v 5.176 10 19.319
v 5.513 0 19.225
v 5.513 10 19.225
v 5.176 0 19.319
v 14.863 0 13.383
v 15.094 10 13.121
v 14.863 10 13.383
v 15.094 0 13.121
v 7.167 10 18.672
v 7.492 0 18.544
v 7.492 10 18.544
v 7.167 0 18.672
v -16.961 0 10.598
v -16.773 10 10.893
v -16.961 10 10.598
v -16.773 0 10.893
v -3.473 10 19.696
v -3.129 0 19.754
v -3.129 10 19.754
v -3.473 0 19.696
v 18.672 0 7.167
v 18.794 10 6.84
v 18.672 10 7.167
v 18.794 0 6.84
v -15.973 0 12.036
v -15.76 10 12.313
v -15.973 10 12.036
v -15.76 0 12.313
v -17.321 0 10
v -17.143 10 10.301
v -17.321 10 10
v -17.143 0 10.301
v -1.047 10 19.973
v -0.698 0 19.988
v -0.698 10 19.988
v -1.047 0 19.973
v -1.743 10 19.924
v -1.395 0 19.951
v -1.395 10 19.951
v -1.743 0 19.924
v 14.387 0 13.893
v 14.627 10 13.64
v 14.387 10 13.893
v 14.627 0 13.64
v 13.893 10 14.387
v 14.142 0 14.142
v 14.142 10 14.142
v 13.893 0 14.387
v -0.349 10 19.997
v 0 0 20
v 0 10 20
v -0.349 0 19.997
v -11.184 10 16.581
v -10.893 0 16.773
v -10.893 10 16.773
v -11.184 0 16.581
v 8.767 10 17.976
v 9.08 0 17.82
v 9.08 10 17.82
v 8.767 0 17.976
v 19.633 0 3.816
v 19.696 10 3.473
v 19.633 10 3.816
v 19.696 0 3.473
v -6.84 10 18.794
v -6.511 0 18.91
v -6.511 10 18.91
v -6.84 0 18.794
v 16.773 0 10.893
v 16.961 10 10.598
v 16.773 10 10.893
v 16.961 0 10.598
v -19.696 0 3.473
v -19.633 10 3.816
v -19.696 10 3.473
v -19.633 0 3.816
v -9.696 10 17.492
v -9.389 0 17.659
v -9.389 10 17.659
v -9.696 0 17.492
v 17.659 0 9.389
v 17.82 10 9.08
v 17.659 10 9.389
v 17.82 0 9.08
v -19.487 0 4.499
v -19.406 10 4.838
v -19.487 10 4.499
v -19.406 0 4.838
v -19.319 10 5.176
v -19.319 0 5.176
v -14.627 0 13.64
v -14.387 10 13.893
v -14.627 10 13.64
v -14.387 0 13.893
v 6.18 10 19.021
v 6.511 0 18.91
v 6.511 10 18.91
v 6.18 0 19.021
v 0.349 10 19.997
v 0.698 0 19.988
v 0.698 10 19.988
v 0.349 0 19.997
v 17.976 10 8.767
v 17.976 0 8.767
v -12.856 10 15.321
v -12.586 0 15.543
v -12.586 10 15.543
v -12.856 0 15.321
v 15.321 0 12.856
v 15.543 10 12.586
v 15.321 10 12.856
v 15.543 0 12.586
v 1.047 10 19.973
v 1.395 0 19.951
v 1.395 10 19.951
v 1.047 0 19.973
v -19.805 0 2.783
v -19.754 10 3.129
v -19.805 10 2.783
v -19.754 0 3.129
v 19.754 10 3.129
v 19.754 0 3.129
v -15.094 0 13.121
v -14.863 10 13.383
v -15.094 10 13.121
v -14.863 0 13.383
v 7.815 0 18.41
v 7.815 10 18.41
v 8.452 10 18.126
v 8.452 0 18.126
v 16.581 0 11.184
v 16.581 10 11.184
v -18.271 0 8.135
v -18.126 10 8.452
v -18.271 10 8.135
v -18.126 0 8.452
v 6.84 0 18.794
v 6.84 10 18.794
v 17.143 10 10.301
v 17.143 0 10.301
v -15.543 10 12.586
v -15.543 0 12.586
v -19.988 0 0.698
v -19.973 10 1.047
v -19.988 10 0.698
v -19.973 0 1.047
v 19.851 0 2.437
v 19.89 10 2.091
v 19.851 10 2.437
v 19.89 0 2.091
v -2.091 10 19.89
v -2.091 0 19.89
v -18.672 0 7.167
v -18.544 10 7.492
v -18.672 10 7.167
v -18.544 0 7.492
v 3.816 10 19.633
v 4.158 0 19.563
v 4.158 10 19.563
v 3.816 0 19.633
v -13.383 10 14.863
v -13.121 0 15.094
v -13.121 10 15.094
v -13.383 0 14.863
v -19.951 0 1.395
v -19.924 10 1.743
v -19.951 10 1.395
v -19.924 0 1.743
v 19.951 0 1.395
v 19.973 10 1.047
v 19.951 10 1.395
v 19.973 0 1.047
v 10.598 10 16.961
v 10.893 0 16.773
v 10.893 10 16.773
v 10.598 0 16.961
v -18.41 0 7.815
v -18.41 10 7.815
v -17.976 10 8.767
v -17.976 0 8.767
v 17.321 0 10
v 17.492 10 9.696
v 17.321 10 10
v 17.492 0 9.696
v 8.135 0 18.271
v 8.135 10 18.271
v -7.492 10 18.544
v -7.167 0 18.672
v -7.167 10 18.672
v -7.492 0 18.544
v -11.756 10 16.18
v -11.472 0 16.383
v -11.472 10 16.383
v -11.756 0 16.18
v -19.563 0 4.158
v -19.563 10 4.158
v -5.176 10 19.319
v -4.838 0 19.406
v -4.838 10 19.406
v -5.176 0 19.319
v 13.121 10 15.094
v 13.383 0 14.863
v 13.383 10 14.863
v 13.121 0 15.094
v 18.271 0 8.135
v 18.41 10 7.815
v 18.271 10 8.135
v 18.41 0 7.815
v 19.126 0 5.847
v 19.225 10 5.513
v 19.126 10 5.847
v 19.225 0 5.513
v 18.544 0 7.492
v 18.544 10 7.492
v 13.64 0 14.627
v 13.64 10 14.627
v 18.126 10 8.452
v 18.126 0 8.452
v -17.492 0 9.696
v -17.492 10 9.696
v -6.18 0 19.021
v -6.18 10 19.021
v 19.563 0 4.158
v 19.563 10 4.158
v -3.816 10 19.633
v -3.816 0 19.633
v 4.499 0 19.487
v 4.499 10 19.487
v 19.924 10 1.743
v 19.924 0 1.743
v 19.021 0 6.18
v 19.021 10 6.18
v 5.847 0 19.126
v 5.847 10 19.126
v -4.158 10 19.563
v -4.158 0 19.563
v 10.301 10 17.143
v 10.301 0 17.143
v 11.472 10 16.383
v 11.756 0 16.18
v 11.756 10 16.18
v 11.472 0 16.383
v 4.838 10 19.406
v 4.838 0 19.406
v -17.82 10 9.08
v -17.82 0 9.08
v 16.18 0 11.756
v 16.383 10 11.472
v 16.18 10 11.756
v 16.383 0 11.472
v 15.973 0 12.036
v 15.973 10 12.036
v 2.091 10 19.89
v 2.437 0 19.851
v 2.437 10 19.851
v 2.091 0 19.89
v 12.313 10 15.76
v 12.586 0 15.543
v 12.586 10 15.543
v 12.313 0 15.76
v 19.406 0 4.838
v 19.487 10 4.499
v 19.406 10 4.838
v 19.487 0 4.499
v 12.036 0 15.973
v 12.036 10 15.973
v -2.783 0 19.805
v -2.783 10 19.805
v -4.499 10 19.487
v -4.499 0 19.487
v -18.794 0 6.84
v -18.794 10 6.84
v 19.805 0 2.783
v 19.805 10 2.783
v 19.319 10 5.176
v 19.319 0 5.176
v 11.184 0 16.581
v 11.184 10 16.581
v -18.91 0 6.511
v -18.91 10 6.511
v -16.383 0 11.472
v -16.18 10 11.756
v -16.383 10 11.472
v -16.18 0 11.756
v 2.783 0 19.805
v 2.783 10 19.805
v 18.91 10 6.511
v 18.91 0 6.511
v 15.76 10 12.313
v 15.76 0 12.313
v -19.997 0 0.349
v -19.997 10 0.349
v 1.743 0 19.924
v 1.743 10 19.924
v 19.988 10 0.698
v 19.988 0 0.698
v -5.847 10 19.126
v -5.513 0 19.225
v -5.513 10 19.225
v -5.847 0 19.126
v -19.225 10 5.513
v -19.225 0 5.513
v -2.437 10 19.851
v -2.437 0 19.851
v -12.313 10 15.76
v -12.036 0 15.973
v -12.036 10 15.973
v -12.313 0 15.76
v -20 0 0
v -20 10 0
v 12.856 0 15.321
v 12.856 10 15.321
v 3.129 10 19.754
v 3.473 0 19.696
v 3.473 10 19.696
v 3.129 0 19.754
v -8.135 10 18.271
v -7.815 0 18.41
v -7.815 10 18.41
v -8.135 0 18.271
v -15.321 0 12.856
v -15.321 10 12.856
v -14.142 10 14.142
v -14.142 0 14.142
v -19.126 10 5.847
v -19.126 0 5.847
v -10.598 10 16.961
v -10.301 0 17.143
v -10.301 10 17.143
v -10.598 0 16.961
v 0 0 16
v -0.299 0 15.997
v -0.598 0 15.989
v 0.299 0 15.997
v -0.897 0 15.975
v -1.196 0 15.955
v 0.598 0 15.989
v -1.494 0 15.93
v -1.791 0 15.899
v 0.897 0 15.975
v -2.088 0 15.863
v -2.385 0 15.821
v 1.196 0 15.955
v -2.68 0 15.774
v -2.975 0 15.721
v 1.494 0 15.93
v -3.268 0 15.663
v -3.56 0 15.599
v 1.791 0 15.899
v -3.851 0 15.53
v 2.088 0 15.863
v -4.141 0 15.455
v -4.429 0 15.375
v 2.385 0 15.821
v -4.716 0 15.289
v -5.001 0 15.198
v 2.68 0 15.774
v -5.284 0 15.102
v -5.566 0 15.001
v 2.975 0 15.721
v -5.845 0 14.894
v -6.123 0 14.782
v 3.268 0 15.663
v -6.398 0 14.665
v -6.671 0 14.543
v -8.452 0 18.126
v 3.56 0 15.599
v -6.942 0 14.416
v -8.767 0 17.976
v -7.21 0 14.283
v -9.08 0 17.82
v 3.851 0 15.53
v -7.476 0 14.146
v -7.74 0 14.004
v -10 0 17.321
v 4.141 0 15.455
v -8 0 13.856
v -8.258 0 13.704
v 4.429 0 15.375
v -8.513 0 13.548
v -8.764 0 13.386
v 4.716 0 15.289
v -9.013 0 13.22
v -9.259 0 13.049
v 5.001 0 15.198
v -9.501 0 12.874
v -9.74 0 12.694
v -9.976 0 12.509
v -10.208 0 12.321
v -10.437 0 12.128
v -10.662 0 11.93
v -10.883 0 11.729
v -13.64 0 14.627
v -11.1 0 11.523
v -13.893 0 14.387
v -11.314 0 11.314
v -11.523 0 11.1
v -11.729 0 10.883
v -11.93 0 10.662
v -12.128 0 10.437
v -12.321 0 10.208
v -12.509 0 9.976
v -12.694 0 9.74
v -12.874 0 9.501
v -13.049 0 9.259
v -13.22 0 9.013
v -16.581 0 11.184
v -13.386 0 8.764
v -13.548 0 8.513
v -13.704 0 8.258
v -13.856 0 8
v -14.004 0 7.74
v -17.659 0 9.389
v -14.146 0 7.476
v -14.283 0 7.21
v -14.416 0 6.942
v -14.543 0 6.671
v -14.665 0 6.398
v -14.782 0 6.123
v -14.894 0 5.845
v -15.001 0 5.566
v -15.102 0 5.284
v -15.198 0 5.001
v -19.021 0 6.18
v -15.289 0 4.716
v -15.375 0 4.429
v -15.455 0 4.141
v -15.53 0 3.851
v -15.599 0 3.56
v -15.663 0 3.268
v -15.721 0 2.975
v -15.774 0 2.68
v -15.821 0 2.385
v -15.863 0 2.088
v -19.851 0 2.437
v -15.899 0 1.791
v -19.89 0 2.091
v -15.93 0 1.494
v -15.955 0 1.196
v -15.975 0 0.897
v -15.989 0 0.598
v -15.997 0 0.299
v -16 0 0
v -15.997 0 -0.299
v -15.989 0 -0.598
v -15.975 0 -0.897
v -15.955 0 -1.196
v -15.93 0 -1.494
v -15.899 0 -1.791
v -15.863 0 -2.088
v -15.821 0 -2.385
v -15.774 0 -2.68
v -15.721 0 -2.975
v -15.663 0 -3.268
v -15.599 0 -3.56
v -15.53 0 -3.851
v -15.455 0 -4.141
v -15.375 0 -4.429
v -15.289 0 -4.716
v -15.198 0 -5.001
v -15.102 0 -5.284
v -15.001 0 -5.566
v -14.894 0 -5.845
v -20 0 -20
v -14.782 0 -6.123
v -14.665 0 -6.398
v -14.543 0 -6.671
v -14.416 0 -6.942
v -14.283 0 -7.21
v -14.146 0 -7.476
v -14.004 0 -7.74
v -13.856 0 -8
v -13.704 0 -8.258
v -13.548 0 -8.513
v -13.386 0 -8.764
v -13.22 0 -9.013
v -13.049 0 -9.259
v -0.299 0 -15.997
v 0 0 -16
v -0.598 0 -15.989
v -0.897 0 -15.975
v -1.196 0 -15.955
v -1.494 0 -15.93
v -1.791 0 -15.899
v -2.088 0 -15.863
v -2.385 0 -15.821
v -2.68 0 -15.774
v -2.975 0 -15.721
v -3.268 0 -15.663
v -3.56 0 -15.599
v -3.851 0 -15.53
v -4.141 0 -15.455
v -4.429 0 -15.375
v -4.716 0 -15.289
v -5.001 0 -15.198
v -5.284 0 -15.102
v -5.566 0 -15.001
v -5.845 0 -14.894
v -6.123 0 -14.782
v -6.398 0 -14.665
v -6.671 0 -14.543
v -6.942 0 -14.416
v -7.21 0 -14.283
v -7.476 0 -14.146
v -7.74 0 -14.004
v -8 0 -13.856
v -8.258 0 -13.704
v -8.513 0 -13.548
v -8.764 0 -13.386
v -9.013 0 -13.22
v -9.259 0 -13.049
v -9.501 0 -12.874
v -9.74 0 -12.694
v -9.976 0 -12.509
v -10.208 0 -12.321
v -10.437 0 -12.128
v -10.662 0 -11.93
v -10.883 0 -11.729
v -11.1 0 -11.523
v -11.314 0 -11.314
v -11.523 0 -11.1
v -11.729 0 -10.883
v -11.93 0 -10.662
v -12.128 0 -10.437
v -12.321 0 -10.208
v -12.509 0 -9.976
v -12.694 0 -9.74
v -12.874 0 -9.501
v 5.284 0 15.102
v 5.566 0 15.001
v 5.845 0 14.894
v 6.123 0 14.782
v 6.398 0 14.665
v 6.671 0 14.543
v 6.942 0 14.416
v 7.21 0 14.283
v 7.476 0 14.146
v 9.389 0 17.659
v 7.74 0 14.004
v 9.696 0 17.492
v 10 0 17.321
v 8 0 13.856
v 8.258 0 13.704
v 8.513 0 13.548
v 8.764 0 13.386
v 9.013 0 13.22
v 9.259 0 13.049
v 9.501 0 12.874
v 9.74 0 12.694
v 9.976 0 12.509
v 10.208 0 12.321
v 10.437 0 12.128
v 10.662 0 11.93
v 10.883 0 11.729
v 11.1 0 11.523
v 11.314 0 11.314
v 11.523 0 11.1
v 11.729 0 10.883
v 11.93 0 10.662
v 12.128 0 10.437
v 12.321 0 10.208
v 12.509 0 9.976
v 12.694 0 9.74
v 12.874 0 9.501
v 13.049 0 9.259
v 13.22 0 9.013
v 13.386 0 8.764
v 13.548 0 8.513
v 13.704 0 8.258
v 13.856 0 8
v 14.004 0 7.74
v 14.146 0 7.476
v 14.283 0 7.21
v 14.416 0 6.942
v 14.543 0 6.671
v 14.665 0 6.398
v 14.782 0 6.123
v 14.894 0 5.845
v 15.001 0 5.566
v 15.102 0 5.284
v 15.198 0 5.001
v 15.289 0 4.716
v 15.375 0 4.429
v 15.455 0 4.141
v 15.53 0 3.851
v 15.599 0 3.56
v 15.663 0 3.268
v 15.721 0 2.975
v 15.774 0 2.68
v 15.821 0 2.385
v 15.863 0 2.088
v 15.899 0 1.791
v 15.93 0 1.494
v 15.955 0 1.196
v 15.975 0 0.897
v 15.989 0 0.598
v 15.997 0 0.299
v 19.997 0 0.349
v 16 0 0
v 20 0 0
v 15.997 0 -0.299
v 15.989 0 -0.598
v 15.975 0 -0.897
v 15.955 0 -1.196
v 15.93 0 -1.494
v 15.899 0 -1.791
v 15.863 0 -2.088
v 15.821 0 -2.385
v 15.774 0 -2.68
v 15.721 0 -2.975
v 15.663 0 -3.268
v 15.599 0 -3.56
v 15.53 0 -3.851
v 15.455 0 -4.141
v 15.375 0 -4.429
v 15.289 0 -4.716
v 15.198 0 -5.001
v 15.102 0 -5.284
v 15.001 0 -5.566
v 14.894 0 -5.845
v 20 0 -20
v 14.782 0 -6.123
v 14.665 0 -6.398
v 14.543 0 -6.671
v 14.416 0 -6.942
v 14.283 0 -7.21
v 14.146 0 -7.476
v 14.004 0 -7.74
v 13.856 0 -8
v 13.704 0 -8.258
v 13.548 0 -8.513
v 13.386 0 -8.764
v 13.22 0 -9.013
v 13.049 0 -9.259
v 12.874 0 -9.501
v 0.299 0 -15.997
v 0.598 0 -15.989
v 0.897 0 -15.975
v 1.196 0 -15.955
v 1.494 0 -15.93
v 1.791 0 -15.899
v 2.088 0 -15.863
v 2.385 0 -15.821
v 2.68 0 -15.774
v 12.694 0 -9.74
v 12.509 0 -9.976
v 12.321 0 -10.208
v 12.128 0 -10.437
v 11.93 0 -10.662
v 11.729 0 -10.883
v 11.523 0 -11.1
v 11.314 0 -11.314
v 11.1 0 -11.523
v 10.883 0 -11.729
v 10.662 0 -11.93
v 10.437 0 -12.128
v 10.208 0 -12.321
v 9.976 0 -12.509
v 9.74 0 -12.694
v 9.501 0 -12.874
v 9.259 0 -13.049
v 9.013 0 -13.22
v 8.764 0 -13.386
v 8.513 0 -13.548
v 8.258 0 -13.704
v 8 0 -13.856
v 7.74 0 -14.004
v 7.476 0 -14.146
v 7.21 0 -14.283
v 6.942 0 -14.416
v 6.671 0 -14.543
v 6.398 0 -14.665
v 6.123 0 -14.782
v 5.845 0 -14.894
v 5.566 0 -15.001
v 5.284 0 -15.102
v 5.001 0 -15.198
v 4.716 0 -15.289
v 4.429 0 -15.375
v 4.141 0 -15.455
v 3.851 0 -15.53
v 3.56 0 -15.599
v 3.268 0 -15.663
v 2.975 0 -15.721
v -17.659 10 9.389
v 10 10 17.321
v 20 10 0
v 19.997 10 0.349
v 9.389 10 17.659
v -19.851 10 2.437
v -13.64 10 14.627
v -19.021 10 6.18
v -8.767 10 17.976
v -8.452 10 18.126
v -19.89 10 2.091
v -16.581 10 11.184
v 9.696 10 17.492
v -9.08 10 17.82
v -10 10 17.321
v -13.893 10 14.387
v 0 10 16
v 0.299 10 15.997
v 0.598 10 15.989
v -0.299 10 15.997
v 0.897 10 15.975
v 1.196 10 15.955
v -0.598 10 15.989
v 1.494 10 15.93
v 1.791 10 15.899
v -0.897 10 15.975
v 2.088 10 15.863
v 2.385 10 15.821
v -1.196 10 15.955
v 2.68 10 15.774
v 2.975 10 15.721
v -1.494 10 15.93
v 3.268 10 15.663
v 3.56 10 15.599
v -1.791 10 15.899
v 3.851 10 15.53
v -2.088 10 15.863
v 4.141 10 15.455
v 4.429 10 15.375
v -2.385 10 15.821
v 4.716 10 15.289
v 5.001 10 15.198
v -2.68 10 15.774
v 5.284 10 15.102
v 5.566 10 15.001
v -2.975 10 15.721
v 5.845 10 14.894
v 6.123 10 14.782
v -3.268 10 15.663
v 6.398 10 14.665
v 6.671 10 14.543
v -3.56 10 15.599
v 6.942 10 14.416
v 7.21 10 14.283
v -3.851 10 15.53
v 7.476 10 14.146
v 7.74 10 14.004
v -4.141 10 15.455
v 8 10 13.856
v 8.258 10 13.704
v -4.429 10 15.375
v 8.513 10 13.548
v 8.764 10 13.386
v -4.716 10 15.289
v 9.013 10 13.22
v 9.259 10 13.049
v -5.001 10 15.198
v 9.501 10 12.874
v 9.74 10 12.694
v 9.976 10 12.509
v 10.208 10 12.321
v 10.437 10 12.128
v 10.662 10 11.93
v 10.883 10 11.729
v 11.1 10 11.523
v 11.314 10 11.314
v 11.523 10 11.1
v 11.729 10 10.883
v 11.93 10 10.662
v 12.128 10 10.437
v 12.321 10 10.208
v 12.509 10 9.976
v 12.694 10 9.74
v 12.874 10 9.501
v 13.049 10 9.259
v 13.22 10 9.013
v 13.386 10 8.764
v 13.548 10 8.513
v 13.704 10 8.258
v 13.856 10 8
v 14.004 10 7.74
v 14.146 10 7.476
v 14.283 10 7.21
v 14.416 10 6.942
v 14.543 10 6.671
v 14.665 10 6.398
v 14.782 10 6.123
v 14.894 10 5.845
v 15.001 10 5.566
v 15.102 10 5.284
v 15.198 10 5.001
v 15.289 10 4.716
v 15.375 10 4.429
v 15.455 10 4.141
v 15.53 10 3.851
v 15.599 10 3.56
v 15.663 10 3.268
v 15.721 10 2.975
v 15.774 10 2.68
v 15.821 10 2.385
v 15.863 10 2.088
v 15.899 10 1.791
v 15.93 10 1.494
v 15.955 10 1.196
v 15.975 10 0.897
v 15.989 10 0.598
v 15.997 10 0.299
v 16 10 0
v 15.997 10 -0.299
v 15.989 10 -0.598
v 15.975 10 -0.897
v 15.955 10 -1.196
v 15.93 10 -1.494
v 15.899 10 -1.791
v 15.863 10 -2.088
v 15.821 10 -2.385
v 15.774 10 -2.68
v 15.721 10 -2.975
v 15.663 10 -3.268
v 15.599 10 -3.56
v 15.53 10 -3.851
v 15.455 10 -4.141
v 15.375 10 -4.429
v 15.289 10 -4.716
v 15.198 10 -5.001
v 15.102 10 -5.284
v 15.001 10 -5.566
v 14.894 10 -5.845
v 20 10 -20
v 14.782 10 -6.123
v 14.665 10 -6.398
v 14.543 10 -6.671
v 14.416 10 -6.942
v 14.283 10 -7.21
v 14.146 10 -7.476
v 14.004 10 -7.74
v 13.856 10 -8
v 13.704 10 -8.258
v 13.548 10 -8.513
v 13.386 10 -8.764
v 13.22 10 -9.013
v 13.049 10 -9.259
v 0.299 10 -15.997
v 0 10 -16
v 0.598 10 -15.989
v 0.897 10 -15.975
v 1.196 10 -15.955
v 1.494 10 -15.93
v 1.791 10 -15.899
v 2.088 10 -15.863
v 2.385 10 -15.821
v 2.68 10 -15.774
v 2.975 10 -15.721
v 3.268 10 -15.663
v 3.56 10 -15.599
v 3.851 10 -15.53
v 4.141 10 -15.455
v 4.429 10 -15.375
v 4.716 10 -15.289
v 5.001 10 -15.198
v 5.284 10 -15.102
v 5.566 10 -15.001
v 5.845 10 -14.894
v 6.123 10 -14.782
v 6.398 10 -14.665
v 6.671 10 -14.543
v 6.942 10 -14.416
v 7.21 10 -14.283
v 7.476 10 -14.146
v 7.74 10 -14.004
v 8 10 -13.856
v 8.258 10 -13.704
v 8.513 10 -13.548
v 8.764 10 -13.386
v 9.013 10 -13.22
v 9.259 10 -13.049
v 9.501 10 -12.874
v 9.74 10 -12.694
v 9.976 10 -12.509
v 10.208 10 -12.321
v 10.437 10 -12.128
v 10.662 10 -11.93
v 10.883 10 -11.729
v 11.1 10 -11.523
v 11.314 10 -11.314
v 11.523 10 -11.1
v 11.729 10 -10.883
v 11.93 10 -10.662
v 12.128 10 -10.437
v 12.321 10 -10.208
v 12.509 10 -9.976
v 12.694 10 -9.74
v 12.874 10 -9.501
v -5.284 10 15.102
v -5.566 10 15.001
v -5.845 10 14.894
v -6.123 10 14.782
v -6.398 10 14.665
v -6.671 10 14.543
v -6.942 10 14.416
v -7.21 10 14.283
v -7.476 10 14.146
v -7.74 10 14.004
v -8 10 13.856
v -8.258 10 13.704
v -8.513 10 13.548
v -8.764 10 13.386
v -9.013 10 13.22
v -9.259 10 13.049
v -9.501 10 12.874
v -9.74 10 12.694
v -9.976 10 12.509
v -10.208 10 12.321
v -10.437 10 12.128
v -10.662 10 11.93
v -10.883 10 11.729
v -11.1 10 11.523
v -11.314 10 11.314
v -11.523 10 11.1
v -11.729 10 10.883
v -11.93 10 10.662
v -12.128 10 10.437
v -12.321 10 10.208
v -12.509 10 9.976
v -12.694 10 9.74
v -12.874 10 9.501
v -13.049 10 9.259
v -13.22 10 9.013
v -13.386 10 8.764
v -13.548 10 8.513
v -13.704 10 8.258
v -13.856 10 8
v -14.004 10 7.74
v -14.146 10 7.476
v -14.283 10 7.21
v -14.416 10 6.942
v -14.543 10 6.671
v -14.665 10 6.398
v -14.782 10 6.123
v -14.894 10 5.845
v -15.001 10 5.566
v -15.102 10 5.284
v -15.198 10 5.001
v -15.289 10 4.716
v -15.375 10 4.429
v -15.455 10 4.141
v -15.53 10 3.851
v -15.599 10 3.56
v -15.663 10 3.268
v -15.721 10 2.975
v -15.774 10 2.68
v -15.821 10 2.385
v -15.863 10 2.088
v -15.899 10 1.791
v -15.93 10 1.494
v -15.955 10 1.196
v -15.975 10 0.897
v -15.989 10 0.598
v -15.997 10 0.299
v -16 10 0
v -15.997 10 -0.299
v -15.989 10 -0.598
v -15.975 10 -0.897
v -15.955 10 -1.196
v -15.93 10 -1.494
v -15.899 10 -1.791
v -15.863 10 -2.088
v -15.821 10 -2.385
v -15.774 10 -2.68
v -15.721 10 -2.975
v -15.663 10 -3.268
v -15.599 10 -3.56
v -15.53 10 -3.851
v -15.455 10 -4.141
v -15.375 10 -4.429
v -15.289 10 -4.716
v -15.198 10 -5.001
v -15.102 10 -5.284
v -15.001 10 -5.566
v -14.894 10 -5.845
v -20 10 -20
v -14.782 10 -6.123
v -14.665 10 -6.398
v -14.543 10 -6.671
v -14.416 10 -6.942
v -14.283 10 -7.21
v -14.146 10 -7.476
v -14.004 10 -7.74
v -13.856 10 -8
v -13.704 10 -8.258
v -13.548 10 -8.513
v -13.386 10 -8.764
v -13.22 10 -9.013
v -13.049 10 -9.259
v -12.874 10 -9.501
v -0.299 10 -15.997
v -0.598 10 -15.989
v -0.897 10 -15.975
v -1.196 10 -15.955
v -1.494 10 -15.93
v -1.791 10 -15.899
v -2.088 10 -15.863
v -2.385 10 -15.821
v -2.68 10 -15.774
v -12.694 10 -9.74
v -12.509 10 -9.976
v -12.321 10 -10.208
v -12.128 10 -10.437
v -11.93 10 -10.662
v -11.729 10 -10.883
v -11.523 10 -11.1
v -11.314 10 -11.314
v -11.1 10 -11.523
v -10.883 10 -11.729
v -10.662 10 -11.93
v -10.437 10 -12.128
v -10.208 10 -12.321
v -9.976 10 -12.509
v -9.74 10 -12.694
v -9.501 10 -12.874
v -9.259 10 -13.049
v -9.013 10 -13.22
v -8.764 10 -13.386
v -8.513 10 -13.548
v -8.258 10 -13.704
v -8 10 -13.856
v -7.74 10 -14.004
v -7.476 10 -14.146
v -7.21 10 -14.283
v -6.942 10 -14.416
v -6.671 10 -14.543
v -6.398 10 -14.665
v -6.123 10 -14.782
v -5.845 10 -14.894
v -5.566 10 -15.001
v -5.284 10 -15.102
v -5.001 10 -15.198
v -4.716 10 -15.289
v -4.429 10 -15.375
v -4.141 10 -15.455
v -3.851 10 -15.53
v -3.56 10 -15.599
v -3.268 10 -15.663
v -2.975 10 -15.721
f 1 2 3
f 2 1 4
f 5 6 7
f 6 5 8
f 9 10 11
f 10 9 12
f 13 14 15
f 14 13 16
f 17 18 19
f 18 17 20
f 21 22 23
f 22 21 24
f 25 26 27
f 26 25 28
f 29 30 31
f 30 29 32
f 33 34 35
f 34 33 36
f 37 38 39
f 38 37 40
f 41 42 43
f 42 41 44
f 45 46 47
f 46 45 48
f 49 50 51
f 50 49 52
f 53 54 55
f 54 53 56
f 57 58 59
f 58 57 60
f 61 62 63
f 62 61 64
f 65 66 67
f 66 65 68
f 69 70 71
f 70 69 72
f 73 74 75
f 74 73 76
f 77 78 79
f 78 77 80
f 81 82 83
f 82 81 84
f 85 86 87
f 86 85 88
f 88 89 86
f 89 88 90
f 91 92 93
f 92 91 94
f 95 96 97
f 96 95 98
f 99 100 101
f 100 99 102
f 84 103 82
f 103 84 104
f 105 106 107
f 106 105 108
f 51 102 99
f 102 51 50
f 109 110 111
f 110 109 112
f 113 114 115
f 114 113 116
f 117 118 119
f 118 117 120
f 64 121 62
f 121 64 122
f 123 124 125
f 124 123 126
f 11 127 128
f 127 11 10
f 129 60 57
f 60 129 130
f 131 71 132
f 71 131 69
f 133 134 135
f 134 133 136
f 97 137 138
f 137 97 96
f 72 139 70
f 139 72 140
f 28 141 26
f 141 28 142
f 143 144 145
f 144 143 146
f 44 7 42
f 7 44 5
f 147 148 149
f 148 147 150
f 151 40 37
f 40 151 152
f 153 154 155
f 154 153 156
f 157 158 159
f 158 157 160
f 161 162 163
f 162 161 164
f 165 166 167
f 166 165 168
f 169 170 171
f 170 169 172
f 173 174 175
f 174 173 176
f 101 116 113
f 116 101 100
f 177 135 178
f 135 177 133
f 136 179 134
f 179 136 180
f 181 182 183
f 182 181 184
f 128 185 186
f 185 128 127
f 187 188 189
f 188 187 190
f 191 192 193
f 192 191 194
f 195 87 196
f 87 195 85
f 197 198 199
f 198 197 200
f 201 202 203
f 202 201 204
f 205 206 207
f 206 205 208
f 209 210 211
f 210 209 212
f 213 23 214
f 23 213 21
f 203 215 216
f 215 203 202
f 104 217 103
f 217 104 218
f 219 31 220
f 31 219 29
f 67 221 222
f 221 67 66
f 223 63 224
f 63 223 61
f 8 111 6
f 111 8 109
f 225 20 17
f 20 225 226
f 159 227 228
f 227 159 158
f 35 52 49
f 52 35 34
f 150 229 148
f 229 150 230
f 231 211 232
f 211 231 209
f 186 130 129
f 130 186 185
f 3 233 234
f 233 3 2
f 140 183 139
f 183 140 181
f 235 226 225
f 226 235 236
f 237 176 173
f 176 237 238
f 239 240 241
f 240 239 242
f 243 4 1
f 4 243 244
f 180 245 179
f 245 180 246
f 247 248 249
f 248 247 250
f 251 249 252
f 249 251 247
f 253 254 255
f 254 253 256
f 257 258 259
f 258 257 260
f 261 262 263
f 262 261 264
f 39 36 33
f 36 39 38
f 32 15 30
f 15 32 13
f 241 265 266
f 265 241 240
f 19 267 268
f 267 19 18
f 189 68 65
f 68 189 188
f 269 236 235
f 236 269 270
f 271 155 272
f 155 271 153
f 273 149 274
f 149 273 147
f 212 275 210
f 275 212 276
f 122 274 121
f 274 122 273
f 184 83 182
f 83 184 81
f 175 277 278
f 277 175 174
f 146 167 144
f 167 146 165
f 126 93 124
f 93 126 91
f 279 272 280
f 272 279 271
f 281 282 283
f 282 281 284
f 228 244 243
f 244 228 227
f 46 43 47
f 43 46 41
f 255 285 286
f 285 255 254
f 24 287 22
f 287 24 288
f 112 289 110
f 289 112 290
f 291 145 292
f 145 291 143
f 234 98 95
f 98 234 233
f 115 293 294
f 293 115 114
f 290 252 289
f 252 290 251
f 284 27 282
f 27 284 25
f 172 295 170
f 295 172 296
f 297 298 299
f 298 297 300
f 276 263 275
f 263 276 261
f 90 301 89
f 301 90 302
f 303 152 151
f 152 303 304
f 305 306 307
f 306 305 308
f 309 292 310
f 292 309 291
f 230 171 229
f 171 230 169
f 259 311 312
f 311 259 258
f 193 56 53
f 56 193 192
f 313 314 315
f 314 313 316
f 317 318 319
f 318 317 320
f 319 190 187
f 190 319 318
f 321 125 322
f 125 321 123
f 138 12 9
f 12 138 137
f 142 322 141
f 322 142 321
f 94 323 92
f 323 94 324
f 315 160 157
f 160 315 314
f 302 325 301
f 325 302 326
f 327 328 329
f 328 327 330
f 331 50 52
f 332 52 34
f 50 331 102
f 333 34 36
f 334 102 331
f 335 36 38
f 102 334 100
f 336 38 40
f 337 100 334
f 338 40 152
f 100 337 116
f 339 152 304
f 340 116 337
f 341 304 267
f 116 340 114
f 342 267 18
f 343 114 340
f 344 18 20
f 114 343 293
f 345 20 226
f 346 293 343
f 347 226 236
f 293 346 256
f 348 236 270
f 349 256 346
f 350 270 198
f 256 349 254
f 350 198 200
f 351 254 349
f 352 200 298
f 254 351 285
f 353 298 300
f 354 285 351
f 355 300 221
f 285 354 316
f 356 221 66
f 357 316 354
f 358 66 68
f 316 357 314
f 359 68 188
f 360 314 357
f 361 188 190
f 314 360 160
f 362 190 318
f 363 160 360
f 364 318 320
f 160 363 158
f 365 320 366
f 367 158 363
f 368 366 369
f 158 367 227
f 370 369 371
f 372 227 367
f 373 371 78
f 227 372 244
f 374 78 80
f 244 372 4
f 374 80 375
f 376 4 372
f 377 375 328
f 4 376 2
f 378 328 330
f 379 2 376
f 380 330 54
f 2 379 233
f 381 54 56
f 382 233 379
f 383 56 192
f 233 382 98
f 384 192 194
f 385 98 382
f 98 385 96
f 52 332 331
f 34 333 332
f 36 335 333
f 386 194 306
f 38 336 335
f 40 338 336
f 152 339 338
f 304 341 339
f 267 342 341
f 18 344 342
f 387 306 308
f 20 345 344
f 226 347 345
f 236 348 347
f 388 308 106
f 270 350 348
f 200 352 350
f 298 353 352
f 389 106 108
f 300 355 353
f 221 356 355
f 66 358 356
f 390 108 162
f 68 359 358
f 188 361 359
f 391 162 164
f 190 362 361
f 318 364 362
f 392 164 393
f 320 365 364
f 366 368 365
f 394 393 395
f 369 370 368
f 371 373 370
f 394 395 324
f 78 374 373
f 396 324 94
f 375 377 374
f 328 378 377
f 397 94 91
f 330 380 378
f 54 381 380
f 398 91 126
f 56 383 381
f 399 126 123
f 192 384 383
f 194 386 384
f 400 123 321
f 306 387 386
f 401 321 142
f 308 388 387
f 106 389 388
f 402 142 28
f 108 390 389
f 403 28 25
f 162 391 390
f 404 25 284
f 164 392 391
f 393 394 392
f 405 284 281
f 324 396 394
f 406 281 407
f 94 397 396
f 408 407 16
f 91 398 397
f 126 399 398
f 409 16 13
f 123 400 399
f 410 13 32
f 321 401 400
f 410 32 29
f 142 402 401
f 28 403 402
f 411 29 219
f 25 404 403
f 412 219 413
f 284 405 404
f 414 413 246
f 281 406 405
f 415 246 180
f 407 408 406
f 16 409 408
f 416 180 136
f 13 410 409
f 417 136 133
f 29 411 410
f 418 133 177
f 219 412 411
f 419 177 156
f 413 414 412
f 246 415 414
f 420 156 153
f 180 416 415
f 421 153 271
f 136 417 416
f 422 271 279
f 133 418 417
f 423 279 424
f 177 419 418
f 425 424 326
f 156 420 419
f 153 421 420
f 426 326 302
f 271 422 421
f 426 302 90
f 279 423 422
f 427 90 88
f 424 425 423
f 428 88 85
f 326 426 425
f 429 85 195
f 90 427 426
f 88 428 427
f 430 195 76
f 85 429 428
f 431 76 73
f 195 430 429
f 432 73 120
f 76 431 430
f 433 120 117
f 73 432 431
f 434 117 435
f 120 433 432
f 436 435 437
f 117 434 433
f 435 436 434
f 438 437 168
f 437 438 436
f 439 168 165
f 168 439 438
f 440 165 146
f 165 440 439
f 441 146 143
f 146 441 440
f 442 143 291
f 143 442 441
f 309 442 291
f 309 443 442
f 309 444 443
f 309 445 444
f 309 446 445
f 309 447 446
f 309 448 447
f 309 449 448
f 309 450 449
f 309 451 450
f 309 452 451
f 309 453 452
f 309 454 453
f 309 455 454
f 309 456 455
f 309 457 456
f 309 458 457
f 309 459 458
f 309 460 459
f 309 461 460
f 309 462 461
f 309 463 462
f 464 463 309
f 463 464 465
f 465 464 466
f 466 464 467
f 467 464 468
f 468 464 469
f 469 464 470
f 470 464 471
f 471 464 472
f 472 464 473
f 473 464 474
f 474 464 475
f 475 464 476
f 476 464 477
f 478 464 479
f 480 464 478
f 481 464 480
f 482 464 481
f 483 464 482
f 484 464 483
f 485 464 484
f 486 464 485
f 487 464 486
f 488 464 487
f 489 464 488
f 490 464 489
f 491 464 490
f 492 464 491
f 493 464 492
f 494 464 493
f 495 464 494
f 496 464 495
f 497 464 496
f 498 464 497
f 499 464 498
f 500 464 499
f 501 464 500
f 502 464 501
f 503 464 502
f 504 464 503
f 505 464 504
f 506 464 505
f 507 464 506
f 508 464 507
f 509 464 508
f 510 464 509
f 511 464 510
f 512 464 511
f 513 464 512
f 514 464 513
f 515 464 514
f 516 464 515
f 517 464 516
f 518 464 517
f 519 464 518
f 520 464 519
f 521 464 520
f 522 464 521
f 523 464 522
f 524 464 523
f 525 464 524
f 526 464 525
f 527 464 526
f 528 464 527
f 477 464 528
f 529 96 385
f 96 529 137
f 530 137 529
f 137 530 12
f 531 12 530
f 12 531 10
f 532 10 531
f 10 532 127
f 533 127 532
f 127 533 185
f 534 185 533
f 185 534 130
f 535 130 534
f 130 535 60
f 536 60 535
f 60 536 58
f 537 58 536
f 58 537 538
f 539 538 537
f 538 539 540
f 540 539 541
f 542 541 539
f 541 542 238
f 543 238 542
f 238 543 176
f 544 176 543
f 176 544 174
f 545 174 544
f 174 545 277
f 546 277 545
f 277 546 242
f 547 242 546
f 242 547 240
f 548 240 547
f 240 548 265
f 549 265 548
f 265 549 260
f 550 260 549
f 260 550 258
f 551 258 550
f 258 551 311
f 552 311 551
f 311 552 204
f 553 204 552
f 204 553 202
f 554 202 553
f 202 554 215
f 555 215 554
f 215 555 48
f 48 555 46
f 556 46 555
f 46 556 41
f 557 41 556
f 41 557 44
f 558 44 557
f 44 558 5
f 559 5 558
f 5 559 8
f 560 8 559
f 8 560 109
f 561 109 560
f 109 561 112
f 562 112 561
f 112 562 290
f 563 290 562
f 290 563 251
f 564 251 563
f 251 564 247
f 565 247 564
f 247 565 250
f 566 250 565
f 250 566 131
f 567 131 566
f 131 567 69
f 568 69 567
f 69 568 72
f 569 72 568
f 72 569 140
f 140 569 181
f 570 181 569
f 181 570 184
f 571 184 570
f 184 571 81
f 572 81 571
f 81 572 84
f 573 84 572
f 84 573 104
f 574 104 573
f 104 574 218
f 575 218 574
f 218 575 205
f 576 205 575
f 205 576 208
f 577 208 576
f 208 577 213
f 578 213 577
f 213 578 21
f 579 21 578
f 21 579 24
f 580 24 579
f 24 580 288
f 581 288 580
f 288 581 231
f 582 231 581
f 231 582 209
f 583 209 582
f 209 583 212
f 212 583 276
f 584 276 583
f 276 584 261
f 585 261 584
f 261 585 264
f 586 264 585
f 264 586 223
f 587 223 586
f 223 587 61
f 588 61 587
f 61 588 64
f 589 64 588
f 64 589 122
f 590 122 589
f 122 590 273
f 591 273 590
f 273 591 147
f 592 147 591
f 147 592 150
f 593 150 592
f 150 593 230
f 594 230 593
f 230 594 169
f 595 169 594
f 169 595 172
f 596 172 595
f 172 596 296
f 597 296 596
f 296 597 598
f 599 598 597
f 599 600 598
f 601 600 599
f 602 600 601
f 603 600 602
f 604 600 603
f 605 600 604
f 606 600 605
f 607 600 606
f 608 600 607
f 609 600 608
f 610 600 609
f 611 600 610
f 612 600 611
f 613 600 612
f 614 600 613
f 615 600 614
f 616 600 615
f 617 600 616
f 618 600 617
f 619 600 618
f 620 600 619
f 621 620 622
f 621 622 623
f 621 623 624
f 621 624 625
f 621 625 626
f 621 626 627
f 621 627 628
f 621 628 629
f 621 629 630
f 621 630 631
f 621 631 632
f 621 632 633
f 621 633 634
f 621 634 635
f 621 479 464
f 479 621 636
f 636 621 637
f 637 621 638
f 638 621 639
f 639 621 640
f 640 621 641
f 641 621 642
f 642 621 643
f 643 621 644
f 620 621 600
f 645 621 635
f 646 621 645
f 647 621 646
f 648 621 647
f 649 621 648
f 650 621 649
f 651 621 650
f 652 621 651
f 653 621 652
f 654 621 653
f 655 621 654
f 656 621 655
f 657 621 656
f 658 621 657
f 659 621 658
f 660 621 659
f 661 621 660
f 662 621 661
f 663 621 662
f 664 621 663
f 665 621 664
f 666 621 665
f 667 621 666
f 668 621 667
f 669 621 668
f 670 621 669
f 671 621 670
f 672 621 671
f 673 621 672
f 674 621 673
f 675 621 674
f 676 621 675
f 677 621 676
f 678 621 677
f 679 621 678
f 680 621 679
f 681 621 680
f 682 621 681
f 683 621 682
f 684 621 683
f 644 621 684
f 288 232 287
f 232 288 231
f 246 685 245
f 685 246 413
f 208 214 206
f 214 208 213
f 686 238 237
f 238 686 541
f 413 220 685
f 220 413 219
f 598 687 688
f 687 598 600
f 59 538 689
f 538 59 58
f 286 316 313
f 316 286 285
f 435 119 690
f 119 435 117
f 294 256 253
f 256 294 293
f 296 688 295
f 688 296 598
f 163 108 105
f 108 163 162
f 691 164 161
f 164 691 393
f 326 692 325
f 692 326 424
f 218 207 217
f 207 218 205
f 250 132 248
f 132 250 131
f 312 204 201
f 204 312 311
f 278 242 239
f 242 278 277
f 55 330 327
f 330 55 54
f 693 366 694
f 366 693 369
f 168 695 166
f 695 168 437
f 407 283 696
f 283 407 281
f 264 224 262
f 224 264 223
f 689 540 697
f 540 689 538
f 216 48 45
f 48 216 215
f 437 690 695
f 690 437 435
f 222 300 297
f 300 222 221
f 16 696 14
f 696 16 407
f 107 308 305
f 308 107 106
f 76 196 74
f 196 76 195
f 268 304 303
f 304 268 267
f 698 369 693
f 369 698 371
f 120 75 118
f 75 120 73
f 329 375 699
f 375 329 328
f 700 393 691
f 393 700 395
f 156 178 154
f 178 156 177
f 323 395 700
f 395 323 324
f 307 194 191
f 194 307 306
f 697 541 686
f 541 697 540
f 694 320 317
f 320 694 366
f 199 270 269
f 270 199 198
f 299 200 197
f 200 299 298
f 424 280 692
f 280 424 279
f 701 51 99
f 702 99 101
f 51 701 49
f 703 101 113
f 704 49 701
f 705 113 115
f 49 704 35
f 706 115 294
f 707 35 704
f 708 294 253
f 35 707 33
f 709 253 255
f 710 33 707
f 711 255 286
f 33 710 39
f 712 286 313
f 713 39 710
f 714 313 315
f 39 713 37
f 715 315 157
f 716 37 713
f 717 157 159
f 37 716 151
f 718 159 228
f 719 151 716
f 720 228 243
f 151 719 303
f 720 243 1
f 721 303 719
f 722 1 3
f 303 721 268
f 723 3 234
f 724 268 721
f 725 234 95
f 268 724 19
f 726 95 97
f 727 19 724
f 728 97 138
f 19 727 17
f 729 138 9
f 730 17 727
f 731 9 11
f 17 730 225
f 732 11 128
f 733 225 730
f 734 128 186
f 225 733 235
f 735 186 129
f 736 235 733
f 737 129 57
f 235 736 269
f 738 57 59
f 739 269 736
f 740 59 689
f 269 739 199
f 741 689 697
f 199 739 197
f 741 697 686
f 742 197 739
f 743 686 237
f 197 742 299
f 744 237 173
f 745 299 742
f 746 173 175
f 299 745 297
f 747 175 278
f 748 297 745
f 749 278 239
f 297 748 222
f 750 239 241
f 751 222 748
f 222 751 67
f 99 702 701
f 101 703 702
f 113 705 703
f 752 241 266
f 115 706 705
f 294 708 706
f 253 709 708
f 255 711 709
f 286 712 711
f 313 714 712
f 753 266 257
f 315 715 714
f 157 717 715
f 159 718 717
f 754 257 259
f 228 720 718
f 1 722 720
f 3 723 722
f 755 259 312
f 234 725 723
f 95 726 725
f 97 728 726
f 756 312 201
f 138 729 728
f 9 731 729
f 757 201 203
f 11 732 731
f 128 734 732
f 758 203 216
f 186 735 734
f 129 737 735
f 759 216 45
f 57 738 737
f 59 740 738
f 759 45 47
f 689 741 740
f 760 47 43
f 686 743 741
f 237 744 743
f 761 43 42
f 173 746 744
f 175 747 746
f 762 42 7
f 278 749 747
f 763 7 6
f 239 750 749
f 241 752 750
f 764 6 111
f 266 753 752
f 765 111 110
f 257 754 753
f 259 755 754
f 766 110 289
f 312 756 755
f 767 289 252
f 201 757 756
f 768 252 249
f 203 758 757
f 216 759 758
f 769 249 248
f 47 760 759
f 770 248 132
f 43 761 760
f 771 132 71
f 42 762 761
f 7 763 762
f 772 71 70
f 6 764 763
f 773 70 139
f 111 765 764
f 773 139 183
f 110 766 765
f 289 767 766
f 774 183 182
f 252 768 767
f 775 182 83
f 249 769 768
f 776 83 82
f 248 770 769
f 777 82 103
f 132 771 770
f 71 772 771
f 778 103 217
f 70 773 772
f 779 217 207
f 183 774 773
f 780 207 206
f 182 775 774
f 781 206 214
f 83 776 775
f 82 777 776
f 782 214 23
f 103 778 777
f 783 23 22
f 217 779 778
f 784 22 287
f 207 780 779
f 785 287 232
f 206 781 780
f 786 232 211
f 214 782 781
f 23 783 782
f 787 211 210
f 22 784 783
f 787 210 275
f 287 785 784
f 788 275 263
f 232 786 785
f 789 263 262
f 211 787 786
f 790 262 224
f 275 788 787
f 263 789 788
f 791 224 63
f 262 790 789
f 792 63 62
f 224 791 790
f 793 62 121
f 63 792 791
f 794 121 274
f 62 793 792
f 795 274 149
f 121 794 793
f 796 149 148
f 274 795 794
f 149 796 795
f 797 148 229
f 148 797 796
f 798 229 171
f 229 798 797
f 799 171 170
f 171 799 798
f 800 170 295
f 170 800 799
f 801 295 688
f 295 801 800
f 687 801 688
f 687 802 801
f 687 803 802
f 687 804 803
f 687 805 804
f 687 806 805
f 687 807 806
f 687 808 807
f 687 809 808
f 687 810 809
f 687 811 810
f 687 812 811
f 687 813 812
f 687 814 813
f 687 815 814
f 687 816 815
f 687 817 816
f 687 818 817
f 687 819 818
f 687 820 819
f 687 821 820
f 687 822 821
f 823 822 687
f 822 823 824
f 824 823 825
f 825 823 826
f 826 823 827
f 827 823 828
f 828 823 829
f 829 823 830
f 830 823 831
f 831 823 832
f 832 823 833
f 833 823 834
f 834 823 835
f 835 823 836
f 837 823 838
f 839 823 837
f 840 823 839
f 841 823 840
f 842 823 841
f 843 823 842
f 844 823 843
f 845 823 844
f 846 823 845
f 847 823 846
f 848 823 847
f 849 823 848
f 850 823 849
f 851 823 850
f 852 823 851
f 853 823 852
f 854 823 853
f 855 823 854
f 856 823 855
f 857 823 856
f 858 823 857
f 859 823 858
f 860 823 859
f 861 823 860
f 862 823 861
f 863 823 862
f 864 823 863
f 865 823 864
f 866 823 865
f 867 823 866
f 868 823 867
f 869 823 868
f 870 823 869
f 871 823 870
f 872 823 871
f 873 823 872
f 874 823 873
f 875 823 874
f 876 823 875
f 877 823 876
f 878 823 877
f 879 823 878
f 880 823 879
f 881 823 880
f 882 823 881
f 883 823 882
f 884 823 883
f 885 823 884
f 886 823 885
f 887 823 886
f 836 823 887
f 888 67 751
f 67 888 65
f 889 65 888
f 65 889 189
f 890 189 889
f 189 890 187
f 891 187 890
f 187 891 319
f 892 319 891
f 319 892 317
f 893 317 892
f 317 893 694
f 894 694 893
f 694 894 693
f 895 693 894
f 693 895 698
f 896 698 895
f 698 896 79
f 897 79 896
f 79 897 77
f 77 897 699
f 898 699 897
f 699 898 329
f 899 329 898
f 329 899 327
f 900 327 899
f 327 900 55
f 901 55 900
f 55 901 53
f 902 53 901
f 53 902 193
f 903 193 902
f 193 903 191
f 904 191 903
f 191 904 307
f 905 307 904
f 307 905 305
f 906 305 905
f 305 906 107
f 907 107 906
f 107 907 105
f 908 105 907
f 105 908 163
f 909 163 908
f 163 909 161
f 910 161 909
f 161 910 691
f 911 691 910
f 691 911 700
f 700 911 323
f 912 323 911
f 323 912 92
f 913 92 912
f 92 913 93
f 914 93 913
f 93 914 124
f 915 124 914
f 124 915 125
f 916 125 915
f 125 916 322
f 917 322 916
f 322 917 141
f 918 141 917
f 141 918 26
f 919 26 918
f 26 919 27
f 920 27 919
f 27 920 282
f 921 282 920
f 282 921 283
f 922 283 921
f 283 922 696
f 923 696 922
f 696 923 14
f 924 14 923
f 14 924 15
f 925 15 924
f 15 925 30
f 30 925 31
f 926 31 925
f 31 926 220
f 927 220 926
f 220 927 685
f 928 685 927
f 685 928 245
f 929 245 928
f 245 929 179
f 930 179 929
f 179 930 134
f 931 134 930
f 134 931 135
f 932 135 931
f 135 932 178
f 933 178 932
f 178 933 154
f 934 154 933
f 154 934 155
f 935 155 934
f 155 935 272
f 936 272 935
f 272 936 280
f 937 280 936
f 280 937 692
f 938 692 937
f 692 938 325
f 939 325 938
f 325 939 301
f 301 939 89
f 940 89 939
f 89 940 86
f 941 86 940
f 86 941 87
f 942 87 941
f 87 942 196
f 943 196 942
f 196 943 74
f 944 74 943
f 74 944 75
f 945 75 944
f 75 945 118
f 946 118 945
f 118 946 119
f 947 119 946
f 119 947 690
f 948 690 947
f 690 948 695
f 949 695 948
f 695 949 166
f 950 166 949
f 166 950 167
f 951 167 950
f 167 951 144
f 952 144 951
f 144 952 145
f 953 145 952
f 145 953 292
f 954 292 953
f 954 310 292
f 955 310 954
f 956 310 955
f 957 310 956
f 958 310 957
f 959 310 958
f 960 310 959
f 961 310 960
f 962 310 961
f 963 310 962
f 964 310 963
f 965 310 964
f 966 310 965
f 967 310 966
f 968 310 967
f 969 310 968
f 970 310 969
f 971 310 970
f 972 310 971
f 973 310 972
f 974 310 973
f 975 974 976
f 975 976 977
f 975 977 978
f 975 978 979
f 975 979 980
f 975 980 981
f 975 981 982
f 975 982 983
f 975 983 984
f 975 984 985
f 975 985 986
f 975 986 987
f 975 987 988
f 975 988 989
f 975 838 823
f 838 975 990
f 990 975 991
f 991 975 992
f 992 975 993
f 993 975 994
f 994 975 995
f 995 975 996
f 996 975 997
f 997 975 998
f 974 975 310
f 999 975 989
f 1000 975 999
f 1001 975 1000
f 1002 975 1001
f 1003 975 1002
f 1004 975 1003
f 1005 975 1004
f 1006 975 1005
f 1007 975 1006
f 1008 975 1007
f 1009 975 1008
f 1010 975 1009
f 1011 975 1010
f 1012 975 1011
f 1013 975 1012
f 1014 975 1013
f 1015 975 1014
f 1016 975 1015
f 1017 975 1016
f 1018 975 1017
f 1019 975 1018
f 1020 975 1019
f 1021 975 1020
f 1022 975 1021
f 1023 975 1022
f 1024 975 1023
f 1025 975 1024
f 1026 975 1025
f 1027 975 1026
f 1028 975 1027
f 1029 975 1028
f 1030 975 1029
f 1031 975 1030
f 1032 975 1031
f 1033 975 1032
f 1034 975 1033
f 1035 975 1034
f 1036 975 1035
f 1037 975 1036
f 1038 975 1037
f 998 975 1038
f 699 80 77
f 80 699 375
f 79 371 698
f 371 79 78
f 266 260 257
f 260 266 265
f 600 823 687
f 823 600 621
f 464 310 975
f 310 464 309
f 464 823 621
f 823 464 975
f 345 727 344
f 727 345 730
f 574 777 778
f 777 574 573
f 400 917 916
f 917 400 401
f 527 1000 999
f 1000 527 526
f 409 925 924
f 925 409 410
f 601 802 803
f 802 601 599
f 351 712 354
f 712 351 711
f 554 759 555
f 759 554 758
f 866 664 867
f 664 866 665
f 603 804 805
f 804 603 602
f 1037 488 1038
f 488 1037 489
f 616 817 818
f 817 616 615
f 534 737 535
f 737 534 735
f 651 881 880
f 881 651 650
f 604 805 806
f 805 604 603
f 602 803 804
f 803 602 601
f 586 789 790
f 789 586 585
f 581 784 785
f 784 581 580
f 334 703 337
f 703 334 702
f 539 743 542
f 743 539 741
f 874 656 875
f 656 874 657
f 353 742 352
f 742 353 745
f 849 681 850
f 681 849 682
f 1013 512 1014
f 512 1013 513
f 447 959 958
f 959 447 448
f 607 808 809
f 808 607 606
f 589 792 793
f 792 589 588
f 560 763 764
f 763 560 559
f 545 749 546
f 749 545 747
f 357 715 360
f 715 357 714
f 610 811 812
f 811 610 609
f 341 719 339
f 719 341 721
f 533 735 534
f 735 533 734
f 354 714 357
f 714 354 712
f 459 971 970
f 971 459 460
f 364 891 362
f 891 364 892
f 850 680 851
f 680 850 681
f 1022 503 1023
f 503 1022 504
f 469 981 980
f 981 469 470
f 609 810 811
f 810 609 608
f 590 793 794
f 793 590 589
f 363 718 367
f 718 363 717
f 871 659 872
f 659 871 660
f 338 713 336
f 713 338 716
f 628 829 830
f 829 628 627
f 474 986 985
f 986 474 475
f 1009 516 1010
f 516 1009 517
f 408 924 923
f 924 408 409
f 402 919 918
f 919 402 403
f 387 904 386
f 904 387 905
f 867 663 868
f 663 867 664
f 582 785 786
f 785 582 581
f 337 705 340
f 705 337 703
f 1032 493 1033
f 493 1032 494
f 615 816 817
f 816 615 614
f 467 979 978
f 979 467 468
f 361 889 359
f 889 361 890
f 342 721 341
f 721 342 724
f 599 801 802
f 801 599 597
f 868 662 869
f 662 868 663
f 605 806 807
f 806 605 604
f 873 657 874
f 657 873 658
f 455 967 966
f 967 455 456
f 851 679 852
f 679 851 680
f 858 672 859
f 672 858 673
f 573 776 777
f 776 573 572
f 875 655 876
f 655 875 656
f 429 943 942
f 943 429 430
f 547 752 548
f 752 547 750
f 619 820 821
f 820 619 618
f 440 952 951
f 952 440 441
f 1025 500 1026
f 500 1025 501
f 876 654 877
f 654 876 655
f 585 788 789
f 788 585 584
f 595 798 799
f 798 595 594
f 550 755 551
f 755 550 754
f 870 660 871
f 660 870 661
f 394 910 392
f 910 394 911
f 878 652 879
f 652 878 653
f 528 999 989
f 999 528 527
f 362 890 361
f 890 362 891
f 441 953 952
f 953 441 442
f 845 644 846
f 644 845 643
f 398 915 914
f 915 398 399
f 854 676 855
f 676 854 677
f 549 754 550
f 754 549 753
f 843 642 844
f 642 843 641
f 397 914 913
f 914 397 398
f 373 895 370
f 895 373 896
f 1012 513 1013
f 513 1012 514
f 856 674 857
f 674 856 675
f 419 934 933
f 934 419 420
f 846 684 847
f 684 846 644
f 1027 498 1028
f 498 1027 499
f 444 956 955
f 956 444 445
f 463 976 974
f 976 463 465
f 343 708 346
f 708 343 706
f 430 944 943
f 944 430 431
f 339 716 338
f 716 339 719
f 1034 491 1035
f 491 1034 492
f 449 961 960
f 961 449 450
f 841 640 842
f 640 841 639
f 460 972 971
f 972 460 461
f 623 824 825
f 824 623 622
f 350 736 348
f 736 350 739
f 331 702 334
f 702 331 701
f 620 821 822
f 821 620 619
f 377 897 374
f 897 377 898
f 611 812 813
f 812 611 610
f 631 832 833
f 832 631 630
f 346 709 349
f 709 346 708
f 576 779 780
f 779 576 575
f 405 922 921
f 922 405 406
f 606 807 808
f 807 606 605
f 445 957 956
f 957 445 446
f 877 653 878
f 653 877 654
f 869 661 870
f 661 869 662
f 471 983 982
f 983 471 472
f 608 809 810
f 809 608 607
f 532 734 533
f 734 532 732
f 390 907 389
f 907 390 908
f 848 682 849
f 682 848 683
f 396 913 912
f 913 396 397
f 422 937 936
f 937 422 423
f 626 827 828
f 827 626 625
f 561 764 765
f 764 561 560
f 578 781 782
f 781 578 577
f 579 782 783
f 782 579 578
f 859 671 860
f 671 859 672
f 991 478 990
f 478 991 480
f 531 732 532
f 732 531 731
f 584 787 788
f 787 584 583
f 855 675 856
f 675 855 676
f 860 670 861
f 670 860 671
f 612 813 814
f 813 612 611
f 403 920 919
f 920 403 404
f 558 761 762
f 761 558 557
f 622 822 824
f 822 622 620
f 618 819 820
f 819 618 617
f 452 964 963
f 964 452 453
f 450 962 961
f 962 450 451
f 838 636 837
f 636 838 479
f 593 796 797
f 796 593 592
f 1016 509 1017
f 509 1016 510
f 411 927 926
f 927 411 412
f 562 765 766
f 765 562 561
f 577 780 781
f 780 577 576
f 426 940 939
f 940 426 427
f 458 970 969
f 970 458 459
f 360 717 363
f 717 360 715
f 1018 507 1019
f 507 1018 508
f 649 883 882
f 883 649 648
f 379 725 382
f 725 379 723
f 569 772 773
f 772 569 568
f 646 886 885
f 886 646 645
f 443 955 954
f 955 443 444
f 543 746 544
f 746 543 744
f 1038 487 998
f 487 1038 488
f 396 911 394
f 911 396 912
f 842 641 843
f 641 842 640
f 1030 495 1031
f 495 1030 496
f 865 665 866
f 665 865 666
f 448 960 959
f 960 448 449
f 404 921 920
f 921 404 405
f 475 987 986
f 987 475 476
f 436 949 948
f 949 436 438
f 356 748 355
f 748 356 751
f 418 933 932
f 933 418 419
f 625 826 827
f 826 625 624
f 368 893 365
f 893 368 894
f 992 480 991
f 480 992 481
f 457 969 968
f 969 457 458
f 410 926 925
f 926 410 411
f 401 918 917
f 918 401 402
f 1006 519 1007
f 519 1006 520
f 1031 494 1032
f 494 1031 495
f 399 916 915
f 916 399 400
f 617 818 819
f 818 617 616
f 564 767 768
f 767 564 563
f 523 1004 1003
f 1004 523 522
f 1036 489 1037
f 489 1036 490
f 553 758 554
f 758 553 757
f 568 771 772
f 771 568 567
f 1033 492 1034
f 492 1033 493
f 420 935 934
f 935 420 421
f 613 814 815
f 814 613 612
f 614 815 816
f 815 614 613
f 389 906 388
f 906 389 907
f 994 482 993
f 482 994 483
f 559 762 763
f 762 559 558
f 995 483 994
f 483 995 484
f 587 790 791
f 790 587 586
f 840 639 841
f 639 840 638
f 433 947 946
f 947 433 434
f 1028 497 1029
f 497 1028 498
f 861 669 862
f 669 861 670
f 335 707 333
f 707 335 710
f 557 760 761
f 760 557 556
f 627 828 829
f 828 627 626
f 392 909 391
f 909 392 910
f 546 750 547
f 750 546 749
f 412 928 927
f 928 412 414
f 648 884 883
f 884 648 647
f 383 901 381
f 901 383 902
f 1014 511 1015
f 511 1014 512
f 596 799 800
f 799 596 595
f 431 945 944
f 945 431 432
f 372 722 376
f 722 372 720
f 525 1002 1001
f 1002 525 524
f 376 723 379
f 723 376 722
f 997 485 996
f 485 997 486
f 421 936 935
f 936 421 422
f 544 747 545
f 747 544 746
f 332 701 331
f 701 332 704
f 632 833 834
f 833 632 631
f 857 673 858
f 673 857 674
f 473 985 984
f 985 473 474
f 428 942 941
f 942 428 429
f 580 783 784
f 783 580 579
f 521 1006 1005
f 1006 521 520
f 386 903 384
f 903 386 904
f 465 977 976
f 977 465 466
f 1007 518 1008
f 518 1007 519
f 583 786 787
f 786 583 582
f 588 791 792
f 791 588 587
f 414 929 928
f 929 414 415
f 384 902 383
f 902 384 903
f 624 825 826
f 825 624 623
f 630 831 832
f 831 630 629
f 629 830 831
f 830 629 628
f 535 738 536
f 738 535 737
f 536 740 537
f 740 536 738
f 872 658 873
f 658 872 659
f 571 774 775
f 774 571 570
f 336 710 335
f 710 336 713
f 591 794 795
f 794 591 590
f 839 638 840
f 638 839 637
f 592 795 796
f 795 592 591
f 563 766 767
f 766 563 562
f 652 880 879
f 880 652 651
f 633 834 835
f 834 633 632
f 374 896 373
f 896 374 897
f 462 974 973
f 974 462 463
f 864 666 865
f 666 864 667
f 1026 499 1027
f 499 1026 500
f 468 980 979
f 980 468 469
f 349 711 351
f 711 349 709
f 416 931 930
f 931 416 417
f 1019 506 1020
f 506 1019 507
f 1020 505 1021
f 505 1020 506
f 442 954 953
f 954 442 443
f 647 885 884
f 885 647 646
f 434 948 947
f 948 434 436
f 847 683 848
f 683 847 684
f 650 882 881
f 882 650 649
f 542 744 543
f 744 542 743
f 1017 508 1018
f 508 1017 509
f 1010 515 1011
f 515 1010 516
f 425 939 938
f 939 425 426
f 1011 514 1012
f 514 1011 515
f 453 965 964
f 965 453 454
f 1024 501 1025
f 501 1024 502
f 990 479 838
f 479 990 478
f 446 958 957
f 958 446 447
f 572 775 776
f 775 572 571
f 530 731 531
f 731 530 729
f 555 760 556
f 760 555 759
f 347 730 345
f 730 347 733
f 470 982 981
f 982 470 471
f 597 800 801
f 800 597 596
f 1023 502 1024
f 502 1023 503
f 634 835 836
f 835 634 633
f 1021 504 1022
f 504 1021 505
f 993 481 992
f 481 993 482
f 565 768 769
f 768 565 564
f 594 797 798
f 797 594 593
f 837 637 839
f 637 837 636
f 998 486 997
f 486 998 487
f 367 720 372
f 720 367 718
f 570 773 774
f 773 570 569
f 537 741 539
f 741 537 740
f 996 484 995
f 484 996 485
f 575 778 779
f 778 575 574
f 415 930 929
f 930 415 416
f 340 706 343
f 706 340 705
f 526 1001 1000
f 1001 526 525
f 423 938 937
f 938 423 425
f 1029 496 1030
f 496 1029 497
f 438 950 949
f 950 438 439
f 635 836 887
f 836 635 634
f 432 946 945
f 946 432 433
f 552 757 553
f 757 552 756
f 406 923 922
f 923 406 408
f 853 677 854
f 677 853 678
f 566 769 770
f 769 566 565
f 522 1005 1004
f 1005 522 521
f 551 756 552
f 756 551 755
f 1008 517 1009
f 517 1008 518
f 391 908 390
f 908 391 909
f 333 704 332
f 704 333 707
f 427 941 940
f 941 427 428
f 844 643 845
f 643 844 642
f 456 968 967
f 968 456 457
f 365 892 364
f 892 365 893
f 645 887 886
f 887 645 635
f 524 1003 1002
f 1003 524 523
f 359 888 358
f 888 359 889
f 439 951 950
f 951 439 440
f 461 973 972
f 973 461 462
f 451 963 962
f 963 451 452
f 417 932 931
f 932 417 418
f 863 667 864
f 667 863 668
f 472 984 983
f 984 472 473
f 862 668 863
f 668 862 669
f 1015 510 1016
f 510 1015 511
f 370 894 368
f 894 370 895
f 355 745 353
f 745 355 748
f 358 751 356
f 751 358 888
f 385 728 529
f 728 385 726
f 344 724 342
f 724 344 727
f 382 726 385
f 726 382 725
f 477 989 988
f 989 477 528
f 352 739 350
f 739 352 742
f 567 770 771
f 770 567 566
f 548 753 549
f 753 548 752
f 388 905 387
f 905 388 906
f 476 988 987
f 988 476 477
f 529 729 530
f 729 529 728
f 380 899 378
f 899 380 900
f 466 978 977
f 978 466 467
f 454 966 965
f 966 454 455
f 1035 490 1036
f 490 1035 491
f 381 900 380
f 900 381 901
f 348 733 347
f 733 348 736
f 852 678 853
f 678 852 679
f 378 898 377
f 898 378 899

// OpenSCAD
$fs = 0.3;
$fa = 1;

rotate([-90, 0, 0]) {
	difference() {
		union() {
			cylinder(r=20, h=10);
			translate([-20, 0, 0]) {
				cube([40, 20, 10]);
			}
		}
		translate([0, 0, -1]) {
			cylinder(r=16, h=12);
		}
	}
}
